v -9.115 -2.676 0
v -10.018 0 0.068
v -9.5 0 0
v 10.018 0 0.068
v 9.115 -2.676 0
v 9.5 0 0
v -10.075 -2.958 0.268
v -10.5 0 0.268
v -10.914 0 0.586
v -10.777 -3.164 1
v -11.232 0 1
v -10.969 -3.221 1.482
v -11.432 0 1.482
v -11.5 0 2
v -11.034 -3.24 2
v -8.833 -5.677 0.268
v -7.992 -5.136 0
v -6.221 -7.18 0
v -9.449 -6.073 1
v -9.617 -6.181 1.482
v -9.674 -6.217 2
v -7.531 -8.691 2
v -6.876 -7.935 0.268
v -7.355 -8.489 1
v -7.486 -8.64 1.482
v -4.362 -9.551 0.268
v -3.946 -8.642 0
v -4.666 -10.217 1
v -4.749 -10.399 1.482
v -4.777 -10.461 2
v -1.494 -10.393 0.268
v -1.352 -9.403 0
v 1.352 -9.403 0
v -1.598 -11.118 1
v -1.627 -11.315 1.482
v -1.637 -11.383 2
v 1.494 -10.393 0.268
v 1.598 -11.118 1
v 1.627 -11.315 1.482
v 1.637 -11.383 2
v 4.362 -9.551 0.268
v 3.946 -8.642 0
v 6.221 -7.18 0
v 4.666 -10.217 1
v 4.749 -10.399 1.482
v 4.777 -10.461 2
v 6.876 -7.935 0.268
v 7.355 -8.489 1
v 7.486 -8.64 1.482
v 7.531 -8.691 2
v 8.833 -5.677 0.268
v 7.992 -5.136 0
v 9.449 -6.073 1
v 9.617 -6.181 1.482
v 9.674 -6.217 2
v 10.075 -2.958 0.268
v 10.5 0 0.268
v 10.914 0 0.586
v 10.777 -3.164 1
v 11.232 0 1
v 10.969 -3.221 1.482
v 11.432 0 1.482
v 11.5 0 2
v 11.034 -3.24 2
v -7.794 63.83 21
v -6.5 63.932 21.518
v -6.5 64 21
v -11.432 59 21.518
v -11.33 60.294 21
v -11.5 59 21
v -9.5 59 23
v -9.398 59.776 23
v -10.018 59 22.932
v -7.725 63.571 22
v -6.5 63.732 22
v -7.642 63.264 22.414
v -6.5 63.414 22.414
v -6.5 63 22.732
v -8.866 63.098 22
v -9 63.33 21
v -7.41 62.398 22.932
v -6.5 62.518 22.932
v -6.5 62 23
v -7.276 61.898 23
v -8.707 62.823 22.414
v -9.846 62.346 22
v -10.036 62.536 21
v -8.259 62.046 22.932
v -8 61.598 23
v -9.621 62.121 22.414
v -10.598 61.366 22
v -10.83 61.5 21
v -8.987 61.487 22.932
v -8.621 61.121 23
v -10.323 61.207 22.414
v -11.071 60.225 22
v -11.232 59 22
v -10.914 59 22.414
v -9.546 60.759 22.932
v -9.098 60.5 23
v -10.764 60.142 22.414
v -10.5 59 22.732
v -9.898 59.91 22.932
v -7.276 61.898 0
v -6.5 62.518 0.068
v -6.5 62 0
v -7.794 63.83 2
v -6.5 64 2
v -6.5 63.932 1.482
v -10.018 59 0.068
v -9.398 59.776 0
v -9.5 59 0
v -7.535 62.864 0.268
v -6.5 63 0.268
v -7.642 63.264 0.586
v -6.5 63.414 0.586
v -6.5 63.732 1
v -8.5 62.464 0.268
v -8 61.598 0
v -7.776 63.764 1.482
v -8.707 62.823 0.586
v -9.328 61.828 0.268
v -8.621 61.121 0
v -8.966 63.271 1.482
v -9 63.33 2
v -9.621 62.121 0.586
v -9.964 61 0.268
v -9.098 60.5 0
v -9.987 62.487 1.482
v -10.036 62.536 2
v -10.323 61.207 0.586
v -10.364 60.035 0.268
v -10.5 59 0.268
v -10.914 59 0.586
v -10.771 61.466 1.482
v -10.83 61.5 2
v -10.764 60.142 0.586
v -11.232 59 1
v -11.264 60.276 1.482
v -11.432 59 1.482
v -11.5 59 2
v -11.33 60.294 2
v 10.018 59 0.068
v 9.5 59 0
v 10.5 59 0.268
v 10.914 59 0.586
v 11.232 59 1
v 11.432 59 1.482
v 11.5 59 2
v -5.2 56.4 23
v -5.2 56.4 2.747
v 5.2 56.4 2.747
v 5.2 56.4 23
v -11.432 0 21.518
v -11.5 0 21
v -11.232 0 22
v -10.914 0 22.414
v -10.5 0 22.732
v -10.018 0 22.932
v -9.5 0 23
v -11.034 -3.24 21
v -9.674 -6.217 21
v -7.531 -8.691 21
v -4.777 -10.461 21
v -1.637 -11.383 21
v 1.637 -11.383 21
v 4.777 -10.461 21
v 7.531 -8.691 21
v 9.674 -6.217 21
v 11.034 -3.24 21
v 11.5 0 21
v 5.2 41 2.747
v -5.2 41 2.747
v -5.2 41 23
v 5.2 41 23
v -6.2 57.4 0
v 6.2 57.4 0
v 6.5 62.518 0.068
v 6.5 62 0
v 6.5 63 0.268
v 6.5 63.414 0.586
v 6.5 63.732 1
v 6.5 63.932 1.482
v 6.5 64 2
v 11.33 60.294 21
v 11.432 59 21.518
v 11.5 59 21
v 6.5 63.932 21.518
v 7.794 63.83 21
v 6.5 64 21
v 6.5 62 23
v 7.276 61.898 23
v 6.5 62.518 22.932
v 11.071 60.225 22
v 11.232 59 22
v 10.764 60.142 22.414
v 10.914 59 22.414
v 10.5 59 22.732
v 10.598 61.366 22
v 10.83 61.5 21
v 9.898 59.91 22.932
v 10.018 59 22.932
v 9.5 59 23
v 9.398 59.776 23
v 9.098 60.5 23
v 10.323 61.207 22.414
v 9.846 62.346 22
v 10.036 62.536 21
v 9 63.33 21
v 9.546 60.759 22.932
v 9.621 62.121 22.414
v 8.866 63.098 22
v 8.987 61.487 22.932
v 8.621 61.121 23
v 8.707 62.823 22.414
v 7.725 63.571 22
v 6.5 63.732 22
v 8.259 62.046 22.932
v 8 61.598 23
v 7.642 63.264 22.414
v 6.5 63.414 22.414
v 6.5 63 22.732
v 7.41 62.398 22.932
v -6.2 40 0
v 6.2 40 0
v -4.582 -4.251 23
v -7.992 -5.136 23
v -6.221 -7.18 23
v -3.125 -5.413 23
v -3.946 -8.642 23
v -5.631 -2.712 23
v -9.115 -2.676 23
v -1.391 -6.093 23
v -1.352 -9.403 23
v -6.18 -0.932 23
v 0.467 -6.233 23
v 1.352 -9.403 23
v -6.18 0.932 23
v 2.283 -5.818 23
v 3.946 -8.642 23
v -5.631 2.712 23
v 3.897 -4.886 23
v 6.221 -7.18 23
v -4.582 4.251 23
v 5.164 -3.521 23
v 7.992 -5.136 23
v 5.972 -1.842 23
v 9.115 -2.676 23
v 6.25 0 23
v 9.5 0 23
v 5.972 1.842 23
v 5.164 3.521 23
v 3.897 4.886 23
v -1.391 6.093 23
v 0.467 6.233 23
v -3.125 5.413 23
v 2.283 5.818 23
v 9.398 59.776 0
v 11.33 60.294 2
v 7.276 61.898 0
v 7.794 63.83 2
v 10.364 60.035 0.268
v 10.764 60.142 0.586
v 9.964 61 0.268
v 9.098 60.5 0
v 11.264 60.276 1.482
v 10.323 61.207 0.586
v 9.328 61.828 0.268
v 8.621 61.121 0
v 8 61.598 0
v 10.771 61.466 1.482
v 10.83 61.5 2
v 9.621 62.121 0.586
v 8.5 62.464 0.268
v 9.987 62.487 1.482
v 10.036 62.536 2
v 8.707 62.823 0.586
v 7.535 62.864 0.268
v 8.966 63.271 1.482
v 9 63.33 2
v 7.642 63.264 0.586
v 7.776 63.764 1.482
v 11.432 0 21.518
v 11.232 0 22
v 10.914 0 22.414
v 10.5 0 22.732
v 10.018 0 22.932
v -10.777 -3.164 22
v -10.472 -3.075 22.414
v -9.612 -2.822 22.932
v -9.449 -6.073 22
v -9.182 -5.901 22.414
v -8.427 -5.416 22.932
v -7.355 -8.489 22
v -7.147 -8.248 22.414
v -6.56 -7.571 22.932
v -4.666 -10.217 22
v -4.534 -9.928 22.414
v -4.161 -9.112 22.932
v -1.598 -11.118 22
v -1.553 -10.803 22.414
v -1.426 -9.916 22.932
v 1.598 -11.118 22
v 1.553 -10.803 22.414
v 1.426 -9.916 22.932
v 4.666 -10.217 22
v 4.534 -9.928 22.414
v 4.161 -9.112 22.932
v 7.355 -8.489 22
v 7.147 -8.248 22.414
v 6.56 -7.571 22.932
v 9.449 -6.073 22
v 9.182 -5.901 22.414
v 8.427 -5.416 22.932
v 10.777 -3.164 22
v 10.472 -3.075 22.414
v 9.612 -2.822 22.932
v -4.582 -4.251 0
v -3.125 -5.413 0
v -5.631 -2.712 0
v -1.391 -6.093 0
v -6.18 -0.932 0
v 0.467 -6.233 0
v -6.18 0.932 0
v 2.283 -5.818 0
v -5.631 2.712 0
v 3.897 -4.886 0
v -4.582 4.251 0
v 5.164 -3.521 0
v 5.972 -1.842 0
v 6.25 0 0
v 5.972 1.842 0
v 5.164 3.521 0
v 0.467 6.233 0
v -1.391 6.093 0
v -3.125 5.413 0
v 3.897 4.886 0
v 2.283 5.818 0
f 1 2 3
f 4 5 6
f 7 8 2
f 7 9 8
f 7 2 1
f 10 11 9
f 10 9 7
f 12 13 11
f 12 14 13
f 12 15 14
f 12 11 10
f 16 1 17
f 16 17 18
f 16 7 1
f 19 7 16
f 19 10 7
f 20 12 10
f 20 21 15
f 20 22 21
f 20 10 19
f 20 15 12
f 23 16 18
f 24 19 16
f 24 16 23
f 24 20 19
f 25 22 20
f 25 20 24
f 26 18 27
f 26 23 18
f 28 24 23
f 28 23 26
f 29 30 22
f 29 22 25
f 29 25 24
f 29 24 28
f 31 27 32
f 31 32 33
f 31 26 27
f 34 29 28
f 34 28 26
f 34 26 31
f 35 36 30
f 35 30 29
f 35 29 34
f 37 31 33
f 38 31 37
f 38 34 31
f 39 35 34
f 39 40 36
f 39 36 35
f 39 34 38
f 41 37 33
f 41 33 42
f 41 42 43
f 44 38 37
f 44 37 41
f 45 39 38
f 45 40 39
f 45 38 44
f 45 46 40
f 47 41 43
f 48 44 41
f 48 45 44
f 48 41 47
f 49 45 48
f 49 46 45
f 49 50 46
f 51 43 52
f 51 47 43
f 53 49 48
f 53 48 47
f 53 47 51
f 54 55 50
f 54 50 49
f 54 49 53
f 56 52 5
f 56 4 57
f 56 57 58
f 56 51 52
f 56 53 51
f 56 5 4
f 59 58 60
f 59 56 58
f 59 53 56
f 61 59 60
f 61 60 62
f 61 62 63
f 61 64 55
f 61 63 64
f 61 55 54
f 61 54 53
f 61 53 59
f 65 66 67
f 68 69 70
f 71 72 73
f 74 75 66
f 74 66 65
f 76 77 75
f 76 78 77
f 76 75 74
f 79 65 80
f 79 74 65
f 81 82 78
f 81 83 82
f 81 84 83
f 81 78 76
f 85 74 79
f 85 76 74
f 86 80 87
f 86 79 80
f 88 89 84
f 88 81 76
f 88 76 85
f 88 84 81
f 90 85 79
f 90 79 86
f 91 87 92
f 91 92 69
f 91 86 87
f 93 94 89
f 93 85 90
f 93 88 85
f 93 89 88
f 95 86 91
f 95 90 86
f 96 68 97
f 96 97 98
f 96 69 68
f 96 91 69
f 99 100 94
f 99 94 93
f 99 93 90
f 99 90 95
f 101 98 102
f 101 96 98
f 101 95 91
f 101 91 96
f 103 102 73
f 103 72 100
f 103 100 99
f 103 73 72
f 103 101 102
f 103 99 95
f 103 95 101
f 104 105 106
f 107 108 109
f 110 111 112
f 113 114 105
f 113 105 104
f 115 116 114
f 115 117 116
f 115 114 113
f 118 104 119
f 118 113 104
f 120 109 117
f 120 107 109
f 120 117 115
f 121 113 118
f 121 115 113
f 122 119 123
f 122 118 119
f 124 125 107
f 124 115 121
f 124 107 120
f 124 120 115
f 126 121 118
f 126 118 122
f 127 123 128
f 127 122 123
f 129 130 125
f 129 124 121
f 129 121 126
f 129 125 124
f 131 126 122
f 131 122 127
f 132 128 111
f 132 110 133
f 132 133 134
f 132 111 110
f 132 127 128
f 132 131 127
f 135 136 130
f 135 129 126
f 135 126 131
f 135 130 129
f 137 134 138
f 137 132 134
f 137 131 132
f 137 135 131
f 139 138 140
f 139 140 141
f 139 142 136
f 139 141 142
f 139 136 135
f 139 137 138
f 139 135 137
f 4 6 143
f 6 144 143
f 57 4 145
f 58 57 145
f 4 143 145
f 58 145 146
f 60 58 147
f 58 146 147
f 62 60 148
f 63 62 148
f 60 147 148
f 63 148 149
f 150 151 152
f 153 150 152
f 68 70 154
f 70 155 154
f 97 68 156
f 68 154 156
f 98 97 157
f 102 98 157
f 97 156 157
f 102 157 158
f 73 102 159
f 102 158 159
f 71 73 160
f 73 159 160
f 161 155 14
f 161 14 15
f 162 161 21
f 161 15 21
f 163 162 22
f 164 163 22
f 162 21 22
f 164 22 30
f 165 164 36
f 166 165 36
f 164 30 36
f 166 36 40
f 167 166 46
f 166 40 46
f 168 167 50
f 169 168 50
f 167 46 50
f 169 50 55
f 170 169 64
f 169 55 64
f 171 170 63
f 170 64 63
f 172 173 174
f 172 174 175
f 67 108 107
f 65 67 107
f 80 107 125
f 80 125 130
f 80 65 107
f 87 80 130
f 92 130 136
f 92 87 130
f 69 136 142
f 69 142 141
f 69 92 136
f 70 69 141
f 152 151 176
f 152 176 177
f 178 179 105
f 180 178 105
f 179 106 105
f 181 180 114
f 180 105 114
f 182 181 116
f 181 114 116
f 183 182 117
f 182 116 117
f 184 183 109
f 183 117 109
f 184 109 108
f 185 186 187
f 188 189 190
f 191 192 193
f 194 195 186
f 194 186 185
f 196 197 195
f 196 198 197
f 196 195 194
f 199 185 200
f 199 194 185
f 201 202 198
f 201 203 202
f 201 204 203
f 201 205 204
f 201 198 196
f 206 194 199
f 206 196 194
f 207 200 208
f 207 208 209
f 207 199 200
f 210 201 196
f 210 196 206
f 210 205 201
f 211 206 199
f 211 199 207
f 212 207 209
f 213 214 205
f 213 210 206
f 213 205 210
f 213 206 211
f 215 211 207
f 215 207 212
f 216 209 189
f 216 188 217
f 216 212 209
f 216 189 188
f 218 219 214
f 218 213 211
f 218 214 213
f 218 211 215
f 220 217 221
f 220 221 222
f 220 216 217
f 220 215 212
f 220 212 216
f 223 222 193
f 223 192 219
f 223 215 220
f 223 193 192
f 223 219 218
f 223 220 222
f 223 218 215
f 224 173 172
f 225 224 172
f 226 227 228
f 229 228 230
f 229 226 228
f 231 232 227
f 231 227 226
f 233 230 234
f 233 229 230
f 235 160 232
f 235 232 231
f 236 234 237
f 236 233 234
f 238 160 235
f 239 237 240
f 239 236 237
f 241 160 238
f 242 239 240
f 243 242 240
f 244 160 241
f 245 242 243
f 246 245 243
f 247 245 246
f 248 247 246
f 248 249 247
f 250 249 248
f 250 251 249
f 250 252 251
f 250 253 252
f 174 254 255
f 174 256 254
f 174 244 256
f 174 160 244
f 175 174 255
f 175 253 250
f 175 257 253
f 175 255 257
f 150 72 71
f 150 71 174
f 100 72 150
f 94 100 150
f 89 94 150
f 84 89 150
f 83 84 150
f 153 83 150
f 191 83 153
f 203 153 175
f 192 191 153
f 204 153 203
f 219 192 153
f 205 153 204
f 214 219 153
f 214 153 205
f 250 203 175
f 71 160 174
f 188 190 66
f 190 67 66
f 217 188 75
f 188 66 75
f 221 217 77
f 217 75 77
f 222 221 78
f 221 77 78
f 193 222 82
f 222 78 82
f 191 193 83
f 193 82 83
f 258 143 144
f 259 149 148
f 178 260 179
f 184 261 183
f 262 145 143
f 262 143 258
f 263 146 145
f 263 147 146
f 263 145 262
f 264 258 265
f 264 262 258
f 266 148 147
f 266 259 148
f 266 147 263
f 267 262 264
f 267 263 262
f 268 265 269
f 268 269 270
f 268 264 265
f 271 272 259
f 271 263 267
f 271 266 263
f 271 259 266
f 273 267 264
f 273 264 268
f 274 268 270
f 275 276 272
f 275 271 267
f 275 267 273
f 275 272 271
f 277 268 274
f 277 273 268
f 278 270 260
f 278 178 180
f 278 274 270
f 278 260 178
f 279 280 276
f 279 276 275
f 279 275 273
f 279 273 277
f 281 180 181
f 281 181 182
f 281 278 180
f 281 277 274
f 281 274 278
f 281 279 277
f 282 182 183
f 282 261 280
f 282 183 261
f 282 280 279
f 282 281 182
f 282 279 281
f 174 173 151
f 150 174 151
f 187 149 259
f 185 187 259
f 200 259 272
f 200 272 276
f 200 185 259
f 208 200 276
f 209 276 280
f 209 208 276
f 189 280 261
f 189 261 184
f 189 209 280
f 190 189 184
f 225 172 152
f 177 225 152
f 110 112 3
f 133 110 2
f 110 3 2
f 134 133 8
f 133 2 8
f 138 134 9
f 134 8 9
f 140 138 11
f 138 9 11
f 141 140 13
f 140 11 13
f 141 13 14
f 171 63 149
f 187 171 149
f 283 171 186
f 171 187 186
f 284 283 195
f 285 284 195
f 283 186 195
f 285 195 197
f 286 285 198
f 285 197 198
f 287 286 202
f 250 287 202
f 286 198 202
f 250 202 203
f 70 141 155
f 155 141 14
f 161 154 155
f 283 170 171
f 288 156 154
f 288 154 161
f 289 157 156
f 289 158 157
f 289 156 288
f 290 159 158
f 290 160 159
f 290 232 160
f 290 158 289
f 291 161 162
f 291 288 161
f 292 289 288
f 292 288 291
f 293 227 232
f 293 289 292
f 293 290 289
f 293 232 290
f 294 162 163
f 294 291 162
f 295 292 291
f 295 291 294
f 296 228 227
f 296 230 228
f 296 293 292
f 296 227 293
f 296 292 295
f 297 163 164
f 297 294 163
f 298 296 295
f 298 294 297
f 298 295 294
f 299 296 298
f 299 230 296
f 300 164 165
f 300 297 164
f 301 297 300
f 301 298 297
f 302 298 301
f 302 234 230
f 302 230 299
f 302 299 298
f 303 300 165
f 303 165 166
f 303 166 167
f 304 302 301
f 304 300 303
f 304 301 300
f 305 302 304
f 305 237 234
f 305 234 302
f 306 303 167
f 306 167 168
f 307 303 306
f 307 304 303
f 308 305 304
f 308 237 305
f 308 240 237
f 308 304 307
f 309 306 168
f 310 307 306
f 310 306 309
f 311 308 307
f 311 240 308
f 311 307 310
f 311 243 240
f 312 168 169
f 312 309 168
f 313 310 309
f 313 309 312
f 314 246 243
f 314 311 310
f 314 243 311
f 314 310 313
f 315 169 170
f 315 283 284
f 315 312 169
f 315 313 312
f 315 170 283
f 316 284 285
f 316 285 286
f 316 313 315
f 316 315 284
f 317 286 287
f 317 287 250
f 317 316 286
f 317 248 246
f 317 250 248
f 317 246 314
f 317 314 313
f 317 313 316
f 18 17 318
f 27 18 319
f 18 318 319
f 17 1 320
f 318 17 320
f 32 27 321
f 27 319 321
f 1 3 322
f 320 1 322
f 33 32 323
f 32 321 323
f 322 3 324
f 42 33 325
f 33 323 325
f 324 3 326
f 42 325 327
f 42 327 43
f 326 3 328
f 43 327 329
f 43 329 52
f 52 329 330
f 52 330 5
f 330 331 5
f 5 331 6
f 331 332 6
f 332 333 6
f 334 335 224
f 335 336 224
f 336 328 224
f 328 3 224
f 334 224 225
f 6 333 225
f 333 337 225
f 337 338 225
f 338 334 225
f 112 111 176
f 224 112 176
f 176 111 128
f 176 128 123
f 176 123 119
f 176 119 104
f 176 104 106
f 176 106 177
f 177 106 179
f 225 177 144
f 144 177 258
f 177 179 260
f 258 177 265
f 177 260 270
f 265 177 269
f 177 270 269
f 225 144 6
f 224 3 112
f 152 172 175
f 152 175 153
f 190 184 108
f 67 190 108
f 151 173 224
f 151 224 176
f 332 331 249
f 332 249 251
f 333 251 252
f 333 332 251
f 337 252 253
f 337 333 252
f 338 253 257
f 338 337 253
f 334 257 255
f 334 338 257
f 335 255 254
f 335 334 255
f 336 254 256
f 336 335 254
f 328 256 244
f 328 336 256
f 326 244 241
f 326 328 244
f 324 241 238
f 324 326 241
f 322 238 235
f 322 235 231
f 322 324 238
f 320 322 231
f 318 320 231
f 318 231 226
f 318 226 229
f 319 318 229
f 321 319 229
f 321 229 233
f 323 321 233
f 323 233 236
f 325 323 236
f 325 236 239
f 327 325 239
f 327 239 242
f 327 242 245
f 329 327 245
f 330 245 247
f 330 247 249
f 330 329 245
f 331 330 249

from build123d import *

# Parameters (mm, degrees)
SKETCH1_W           = 10.4
SKETCH1_H           = 15.4
SKETCH1_R           = 11.5
SKETCH1_R_2         = 6.25
BOSS_EXTRUDE1_DEPTH = 23
CHAMFER2_SIZE       = 1
CHAMFER2_SIZE2      = 2.747477419
FILLET2_R           = 5
FILLET3_R           = 2


with BuildPart() as part:
    # Sketch1 → Boss-Extrude1 (new body)
    # profile 1 of 2: a face of its own
    with BuildSketch(Plane.XY):
        with BuildLine():
            Line((-11.5, 64), (-11.5, 4e-09))
            ThreePointArc((-11.5, 4e-09), (2e-09, 11.5), (11.5, 0))
            Line((11.5, 0), (11.5, 64))
            Line((11.5, 64), (-11.5, 64))
        make_face()
        with Locations((0, 48.7)):
            Rectangle(SKETCH1_W, SKETCH1_H, mode=Mode.SUBTRACT)
    # profile 2 of 2: a face of its own
    with BuildSketch(Plane.XY):
        Circle(SKETCH1_R)
        Circle(SKETCH1_R_2, mode=Mode.SUBTRACT)
    extrude(amount=BOSS_EXTRUDE1_DEPTH)

    # Chamfer2
    chamfer2_edges = [part.edges().sort_by_distance(p)[0] for p in [
        (0, 56.4, 0),
        (-5.2, 48.7, 0),
        (0, 41, 0),
        (5.2, 48.7, 0),
    ]]
    chamfer2_side = [part.faces().sort_by_distance(p)[0] for p in [
        (0, 27.411701329, 0),
    ]]
    chamfer(chamfer2_edges, length=CHAMFER2_SIZE, length2=CHAMFER2_SIZE2, reference=chamfer2_side[0])

    # Fillet2
    fillet2_edges = [part.edges().sort_by_distance(p)[0] for p in [
        (-11.5, 64, 11.5),
        (11.5, 64, 11.5),
    ]]
    fillet(fillet2_edges, radius=FILLET2_R)

    # Fillet3
    fillet3_edges = [part.edges().sort_by_distance(p)[0] for p in [
        (-2e-09, -11.5, 23),
        (11.5, 29.5, 0),
        (-2e-09, -11.5, 0),
        (-11.5, 29.500000002, 0),
        (11.5, 29.5, 23),
        (0, 64, 0),
        (10.035533906, 62.535533906, 0),
        (-10.035533906, 62.535533906, 0),
        (0, 64, 23),
        (10.035533906, 62.535533906, 23),
        (-10.035533906, 62.535533906, 23),
        (-11.5, 29.500000002, 23),
    ]]
    fillet(fillet3_edges, radius=FILLET3_R)


solid = part.part
